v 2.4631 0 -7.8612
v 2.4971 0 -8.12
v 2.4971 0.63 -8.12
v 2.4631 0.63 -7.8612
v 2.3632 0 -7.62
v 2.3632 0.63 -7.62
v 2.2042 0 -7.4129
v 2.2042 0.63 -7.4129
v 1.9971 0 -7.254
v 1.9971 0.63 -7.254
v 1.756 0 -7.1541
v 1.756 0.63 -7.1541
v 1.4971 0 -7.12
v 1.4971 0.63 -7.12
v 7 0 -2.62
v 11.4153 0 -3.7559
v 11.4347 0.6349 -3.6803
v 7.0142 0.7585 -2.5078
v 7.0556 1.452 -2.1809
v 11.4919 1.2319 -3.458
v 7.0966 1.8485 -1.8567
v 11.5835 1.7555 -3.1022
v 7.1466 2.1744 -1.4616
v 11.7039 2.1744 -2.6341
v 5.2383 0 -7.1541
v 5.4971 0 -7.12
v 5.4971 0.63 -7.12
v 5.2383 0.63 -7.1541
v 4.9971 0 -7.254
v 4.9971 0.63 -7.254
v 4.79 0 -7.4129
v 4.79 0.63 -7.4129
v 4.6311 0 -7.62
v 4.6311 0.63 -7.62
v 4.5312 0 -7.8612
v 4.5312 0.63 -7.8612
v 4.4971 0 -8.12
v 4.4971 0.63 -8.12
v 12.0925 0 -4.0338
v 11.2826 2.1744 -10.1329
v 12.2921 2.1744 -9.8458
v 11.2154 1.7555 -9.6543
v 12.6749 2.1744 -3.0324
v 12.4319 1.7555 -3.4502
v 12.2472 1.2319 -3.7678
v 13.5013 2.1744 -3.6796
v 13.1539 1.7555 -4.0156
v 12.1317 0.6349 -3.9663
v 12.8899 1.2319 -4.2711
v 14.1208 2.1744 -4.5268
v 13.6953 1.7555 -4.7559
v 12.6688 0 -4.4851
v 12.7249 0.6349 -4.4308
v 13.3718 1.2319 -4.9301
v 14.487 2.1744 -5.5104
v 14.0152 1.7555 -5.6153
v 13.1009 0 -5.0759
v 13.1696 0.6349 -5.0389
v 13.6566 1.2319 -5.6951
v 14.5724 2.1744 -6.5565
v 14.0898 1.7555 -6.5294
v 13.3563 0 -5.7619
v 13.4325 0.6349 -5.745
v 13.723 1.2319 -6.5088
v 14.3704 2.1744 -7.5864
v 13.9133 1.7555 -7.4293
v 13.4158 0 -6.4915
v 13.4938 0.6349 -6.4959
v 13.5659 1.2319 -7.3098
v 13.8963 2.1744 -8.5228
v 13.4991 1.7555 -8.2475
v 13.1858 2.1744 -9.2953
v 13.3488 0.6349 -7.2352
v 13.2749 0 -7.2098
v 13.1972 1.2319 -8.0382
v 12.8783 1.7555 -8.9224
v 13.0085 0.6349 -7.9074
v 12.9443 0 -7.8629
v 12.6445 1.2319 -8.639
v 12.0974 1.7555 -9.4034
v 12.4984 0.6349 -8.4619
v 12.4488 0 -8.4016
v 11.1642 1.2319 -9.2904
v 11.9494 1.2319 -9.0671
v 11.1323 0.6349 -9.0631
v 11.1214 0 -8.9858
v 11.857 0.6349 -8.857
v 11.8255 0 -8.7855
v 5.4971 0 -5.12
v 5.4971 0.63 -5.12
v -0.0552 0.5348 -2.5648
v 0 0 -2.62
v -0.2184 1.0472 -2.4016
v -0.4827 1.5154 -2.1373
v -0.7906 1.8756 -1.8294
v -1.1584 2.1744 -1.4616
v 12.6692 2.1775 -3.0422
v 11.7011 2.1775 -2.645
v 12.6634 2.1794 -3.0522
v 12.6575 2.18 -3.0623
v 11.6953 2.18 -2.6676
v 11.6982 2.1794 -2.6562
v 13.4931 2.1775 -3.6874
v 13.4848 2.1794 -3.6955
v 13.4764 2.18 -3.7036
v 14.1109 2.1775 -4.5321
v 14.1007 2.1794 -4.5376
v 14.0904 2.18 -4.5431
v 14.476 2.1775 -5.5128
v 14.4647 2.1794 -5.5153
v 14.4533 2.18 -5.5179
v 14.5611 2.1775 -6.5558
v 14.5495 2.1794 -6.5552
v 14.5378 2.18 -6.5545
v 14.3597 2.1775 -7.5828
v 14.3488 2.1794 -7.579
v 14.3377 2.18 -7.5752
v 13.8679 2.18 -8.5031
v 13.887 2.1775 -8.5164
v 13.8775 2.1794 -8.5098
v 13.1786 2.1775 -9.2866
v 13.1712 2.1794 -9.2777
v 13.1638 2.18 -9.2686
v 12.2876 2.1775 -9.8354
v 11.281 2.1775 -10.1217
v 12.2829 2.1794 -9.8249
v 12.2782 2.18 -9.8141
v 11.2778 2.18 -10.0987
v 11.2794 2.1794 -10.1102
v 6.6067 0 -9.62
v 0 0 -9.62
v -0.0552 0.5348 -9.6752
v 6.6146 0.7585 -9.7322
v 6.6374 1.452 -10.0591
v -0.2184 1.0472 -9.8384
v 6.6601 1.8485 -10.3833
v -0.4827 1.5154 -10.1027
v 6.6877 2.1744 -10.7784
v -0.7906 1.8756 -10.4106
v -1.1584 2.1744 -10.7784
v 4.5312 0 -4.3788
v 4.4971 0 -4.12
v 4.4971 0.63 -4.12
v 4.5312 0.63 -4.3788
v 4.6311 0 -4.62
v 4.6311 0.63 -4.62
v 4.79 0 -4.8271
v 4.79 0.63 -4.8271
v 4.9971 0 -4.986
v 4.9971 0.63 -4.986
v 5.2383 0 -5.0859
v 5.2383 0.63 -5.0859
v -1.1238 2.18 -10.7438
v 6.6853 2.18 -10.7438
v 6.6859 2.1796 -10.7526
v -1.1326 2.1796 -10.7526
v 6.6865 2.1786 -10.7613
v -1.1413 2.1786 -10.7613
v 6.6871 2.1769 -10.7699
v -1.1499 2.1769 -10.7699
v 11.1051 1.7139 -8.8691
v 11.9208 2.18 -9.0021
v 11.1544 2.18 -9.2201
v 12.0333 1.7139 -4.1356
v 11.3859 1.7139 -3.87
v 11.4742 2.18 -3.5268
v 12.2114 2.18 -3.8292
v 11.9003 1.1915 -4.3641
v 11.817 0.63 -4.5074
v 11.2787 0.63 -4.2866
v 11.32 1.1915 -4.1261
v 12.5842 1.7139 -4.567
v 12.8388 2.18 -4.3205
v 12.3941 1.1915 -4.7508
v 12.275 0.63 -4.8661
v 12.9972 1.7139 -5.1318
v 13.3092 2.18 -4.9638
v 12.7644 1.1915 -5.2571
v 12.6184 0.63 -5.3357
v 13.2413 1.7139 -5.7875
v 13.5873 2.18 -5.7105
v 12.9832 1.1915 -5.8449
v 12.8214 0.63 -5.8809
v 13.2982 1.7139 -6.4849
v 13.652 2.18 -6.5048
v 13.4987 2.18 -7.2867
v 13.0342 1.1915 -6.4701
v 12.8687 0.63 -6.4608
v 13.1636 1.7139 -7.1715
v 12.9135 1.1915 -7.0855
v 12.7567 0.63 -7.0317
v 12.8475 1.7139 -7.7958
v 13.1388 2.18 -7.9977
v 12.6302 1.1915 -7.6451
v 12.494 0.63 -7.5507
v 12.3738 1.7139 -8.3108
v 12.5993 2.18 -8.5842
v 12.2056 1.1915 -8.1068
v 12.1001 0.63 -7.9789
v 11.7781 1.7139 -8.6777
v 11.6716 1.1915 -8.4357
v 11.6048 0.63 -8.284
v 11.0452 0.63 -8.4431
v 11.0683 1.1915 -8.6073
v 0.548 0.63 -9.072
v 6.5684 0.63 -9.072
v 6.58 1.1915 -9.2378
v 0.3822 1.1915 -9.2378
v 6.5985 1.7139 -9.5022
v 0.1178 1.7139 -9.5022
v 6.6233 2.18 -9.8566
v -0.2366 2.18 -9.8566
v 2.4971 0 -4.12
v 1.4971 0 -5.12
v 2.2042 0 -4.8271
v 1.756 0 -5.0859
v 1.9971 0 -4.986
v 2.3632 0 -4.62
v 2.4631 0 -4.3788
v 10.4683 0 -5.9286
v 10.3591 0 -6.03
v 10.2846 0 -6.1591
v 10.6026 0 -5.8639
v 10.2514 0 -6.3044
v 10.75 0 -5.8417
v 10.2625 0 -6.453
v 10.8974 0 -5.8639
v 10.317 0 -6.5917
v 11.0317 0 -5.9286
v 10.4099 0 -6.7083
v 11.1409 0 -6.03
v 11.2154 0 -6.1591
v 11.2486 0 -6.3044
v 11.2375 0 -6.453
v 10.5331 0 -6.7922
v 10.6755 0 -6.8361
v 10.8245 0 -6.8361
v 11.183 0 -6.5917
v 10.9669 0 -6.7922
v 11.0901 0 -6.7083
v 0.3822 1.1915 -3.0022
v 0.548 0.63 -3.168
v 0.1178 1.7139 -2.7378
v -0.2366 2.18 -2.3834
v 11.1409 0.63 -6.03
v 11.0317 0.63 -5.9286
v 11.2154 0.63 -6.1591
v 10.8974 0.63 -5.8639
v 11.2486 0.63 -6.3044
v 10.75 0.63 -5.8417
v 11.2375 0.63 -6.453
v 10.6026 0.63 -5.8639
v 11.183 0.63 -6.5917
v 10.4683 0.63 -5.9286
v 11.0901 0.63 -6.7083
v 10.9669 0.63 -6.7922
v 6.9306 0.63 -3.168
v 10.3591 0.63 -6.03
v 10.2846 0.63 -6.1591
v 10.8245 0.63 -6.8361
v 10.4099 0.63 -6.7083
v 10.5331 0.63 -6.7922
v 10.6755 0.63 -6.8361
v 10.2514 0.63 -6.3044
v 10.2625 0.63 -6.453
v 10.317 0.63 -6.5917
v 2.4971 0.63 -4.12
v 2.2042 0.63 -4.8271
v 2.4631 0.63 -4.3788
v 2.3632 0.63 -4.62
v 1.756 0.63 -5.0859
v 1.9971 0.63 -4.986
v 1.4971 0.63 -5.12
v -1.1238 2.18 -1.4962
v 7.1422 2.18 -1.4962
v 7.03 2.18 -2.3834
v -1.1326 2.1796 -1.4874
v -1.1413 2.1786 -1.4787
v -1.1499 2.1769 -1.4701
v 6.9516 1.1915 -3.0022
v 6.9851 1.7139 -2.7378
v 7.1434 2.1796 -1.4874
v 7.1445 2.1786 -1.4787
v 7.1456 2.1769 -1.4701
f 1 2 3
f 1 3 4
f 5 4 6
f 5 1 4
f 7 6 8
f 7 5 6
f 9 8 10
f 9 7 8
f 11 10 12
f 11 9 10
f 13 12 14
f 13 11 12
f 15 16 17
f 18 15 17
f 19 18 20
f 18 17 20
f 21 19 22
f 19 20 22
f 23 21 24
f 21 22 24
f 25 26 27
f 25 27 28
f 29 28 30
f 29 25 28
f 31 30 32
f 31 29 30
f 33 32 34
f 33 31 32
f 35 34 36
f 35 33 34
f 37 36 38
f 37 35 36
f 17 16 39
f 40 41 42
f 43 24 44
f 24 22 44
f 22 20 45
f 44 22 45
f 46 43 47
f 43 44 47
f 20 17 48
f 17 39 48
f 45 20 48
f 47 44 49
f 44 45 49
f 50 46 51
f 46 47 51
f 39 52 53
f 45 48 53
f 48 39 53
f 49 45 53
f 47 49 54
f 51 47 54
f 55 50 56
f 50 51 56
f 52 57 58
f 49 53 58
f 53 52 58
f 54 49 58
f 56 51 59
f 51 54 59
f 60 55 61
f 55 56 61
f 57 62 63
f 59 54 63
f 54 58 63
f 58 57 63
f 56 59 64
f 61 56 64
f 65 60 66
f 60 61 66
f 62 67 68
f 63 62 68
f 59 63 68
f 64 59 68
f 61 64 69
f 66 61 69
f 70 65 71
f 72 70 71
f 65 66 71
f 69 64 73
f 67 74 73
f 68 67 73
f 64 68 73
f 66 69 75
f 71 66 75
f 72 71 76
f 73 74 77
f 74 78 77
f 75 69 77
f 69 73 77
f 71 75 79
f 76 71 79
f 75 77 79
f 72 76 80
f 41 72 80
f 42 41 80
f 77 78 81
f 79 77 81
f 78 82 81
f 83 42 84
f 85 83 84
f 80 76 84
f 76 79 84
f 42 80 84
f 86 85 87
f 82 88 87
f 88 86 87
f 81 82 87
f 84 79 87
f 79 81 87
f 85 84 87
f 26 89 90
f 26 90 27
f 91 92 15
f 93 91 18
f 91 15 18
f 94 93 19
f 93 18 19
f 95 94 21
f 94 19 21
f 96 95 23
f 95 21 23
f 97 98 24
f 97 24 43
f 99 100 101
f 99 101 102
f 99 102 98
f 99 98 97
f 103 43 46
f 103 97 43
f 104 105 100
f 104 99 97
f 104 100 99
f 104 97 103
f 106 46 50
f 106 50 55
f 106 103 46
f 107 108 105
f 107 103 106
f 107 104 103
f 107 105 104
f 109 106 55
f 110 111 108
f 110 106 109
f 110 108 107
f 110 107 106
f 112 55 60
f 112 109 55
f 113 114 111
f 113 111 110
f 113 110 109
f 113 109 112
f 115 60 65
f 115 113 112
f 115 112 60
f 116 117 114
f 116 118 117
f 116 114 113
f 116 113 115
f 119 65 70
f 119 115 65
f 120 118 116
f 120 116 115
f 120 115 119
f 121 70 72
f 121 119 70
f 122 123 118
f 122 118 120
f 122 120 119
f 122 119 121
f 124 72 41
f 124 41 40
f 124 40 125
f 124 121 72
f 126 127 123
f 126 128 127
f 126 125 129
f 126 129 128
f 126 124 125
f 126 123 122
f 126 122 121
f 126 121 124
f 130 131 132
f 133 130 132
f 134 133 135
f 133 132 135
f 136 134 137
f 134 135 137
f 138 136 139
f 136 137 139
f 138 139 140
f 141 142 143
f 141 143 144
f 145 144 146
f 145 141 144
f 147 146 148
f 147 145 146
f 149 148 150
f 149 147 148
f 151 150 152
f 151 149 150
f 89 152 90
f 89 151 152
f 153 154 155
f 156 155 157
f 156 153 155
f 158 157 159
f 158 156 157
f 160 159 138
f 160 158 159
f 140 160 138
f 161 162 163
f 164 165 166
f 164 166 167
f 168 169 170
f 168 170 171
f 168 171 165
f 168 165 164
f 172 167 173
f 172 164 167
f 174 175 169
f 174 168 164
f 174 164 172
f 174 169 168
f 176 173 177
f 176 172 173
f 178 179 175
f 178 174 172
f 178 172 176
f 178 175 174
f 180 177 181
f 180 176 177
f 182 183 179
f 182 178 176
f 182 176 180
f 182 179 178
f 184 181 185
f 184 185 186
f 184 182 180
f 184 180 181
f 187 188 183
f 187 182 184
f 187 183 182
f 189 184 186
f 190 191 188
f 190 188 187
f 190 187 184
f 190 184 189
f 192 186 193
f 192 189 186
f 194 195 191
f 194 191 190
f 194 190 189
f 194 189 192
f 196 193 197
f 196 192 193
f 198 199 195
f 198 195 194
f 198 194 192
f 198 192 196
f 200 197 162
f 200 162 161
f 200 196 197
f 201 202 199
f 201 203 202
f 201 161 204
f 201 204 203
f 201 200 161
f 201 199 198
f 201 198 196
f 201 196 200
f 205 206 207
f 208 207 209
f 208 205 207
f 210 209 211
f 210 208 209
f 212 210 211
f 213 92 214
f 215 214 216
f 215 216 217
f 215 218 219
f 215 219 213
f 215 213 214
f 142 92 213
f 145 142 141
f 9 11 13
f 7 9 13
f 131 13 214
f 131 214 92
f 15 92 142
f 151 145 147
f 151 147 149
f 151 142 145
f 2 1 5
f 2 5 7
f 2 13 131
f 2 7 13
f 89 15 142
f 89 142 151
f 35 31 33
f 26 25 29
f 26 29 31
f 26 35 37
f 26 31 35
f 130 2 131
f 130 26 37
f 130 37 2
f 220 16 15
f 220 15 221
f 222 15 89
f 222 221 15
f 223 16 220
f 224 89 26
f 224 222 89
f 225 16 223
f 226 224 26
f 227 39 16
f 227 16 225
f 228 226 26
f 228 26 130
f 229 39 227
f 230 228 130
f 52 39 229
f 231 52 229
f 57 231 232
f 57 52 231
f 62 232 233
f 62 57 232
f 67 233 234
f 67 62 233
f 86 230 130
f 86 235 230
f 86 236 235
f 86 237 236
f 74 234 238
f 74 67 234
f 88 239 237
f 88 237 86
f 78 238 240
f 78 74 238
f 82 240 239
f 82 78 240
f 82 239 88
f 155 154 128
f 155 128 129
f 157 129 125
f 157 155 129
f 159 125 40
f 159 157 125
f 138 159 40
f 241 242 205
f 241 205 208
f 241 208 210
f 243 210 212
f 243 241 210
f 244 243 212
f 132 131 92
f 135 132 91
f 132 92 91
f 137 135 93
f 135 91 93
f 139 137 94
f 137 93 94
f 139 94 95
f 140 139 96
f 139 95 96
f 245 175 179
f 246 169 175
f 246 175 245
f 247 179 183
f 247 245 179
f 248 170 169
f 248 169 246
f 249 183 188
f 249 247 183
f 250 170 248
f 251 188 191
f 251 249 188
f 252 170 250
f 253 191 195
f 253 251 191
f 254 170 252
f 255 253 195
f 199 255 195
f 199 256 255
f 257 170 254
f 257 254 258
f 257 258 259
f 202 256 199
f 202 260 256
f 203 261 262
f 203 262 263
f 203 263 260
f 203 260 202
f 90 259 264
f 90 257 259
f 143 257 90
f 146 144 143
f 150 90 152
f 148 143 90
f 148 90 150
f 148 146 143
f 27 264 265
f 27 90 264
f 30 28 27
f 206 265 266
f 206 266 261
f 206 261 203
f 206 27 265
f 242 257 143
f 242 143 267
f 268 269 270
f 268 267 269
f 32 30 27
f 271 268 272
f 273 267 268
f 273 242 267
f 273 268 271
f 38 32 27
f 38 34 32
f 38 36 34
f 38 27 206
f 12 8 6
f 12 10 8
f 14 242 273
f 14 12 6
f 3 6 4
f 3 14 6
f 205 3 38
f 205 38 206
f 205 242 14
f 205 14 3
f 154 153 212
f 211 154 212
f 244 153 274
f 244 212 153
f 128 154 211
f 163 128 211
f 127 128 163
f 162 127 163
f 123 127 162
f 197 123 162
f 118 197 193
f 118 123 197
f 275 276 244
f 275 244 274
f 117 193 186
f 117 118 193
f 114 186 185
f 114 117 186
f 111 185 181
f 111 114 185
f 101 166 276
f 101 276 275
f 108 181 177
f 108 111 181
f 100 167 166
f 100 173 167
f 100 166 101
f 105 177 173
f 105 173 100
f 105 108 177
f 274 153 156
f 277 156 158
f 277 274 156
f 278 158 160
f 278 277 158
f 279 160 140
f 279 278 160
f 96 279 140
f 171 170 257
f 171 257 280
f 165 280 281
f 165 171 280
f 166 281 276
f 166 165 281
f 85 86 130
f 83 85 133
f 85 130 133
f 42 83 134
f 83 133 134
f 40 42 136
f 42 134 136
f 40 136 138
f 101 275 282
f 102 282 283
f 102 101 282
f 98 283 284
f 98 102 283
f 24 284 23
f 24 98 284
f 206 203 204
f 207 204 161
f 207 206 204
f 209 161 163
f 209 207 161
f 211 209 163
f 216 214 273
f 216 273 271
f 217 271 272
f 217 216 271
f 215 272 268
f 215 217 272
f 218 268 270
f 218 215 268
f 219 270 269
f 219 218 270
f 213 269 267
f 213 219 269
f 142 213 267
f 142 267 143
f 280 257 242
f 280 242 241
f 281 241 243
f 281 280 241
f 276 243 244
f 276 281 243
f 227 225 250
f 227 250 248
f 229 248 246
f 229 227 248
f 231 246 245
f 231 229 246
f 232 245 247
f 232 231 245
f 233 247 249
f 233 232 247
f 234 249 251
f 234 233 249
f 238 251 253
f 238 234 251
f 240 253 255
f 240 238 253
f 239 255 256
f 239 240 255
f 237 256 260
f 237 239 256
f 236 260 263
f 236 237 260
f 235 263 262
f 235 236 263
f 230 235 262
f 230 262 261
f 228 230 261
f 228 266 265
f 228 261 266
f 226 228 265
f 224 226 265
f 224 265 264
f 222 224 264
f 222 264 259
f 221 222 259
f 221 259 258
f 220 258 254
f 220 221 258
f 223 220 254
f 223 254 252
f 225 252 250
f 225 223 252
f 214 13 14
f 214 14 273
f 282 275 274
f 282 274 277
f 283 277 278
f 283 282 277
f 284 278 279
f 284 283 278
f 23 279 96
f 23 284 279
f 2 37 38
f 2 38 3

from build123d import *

# Parameters (mm, degrees)
BOSS_EXTRUDE1_REACH     = 19.38
SKETCH3_W               = 4.76
SKETCH3_H               = 0.63
CUT_EXTRUDE1_DEPTH      = 19.196319901
CUT_EXTRUDE1_DEPTH_BACK = 19.196319901
SKETCH4_R               = 0.5


with BuildPart() as part:
    # Sweep1: sweep along a path in Sketch2
    with BuildLine(Plane(origin=(0, 0, 0), x_dir=(1, 0, 0), z_dir=(0, 1, 0))) as sweep1_path:
        Line((0, 2.62), (7, 2.62))
        Line((7, 2.62), (11.415258217, 3.755932179))
        ThreePointArc((11.415258217, 3.755932179), (13.415796262, 6.491493797), (11.121440392, 8.985763424))
        Line((11.121440392, 8.985763424), (6.606732095, 9.62))
        Line((6.606732095, 9.62), (0, 9.62))
        Line((0, 9.62), (0, 2.62))
    # Sketch1 → Sweep1 (sweep)
    with BuildSketch(Plane(origin=(0, 0, 0), x_dir=(0, 0, -1), z_dir=(1, 0, 0))):
        with BuildLine():
            Line((2.62, 0), (3.74, 0))
            Line((3.74, 0), (3.74, 0.63))
            Line((3.74, 0.63), (3.167964646, 0.63))
            ThreePointArc((3.167964646, 0.63), (2.881836518, 1.458738594), (2.383379953, 2.18))
            Line((2.383379953, 2.18), (1.496179773, 2.18))
            ThreePointArc((1.496179773, 2.18), (1.478667505, 2.178597055), (1.46160194, 2.174424008))
            ThreePointArc((1.46160194, 2.174424008), (2.312336165, 1.231869091), (2.62, 0))
        make_face()
    sweep(path=sweep1_path.line, transition=Transition.RIGHT)

    # Sketch3 → Boss-Extrude1 (add, up to next)
    with BuildSketch(Plane(origin=(1.12, 0, 0), x_dir=(0, 0, -1), z_dir=(1, 0, 0)), mode=Mode.PRIVATE) as boss_extrude1_sk1:
        with Locations((6.12, 0.315)):
            Rectangle(SKETCH3_W, SKETCH3_H)
    boss_extrude1_tool1 = extrude(boss_extrude1_sk1.sketch, amount=BOSS_EXTRUDE1_REACH, mode=Mode.PRIVATE) - part.part
    add(boss_extrude1_tool1.solids().sort_by_distance((1.12, 0.315, -6.12))[0])

    # Sketch4 → Cut-Extrude1 (cut, two sides: drawn at the far end of the back side and taken through both)
    with BuildSketch(Plane(origin=(0, 0.63, 0), x_dir=(1, 0, 0), z_dir=(0, 1, 0)).offset(-CUT_EXTRUDE1_DEPTH_BACK)):
        with Locations(Location((10.75, 6.341726352, 0), (0, 0, 270))):
            Circle(SKETCH4_R)
        with BuildLine():
            Line((1.497140147, 7.12), (1.497140147, 5.12))
            ThreePointArc((1.497140147, 5.12), (2.204246928, 4.827106781), (2.497140147, 4.12))
            Line((2.497140147, 4.12), (4.497140147, 4.12))
            ThreePointArc((4.497140147, 4.12), (4.790033365, 4.827106781), (5.497140147, 5.12))
            Line((5.497140147, 5.12), (5.497140147, 7.12))
            ThreePointArc((5.497140147, 7.12), (4.790033365, 7.412893219), (4.497140147, 8.12))
            Line((4.497140147, 8.12), (2.497140147, 8.12))
            ThreePointArc((2.497140147, 8.12), (2.204246928, 7.412893219), (1.497140147, 7.12))
        make_face()
    extrude(amount=CUT_EXTRUDE1_DEPTH + CUT_EXTRUDE1_DEPTH_BACK, mode=Mode.SUBTRACT)


solid = part.part
